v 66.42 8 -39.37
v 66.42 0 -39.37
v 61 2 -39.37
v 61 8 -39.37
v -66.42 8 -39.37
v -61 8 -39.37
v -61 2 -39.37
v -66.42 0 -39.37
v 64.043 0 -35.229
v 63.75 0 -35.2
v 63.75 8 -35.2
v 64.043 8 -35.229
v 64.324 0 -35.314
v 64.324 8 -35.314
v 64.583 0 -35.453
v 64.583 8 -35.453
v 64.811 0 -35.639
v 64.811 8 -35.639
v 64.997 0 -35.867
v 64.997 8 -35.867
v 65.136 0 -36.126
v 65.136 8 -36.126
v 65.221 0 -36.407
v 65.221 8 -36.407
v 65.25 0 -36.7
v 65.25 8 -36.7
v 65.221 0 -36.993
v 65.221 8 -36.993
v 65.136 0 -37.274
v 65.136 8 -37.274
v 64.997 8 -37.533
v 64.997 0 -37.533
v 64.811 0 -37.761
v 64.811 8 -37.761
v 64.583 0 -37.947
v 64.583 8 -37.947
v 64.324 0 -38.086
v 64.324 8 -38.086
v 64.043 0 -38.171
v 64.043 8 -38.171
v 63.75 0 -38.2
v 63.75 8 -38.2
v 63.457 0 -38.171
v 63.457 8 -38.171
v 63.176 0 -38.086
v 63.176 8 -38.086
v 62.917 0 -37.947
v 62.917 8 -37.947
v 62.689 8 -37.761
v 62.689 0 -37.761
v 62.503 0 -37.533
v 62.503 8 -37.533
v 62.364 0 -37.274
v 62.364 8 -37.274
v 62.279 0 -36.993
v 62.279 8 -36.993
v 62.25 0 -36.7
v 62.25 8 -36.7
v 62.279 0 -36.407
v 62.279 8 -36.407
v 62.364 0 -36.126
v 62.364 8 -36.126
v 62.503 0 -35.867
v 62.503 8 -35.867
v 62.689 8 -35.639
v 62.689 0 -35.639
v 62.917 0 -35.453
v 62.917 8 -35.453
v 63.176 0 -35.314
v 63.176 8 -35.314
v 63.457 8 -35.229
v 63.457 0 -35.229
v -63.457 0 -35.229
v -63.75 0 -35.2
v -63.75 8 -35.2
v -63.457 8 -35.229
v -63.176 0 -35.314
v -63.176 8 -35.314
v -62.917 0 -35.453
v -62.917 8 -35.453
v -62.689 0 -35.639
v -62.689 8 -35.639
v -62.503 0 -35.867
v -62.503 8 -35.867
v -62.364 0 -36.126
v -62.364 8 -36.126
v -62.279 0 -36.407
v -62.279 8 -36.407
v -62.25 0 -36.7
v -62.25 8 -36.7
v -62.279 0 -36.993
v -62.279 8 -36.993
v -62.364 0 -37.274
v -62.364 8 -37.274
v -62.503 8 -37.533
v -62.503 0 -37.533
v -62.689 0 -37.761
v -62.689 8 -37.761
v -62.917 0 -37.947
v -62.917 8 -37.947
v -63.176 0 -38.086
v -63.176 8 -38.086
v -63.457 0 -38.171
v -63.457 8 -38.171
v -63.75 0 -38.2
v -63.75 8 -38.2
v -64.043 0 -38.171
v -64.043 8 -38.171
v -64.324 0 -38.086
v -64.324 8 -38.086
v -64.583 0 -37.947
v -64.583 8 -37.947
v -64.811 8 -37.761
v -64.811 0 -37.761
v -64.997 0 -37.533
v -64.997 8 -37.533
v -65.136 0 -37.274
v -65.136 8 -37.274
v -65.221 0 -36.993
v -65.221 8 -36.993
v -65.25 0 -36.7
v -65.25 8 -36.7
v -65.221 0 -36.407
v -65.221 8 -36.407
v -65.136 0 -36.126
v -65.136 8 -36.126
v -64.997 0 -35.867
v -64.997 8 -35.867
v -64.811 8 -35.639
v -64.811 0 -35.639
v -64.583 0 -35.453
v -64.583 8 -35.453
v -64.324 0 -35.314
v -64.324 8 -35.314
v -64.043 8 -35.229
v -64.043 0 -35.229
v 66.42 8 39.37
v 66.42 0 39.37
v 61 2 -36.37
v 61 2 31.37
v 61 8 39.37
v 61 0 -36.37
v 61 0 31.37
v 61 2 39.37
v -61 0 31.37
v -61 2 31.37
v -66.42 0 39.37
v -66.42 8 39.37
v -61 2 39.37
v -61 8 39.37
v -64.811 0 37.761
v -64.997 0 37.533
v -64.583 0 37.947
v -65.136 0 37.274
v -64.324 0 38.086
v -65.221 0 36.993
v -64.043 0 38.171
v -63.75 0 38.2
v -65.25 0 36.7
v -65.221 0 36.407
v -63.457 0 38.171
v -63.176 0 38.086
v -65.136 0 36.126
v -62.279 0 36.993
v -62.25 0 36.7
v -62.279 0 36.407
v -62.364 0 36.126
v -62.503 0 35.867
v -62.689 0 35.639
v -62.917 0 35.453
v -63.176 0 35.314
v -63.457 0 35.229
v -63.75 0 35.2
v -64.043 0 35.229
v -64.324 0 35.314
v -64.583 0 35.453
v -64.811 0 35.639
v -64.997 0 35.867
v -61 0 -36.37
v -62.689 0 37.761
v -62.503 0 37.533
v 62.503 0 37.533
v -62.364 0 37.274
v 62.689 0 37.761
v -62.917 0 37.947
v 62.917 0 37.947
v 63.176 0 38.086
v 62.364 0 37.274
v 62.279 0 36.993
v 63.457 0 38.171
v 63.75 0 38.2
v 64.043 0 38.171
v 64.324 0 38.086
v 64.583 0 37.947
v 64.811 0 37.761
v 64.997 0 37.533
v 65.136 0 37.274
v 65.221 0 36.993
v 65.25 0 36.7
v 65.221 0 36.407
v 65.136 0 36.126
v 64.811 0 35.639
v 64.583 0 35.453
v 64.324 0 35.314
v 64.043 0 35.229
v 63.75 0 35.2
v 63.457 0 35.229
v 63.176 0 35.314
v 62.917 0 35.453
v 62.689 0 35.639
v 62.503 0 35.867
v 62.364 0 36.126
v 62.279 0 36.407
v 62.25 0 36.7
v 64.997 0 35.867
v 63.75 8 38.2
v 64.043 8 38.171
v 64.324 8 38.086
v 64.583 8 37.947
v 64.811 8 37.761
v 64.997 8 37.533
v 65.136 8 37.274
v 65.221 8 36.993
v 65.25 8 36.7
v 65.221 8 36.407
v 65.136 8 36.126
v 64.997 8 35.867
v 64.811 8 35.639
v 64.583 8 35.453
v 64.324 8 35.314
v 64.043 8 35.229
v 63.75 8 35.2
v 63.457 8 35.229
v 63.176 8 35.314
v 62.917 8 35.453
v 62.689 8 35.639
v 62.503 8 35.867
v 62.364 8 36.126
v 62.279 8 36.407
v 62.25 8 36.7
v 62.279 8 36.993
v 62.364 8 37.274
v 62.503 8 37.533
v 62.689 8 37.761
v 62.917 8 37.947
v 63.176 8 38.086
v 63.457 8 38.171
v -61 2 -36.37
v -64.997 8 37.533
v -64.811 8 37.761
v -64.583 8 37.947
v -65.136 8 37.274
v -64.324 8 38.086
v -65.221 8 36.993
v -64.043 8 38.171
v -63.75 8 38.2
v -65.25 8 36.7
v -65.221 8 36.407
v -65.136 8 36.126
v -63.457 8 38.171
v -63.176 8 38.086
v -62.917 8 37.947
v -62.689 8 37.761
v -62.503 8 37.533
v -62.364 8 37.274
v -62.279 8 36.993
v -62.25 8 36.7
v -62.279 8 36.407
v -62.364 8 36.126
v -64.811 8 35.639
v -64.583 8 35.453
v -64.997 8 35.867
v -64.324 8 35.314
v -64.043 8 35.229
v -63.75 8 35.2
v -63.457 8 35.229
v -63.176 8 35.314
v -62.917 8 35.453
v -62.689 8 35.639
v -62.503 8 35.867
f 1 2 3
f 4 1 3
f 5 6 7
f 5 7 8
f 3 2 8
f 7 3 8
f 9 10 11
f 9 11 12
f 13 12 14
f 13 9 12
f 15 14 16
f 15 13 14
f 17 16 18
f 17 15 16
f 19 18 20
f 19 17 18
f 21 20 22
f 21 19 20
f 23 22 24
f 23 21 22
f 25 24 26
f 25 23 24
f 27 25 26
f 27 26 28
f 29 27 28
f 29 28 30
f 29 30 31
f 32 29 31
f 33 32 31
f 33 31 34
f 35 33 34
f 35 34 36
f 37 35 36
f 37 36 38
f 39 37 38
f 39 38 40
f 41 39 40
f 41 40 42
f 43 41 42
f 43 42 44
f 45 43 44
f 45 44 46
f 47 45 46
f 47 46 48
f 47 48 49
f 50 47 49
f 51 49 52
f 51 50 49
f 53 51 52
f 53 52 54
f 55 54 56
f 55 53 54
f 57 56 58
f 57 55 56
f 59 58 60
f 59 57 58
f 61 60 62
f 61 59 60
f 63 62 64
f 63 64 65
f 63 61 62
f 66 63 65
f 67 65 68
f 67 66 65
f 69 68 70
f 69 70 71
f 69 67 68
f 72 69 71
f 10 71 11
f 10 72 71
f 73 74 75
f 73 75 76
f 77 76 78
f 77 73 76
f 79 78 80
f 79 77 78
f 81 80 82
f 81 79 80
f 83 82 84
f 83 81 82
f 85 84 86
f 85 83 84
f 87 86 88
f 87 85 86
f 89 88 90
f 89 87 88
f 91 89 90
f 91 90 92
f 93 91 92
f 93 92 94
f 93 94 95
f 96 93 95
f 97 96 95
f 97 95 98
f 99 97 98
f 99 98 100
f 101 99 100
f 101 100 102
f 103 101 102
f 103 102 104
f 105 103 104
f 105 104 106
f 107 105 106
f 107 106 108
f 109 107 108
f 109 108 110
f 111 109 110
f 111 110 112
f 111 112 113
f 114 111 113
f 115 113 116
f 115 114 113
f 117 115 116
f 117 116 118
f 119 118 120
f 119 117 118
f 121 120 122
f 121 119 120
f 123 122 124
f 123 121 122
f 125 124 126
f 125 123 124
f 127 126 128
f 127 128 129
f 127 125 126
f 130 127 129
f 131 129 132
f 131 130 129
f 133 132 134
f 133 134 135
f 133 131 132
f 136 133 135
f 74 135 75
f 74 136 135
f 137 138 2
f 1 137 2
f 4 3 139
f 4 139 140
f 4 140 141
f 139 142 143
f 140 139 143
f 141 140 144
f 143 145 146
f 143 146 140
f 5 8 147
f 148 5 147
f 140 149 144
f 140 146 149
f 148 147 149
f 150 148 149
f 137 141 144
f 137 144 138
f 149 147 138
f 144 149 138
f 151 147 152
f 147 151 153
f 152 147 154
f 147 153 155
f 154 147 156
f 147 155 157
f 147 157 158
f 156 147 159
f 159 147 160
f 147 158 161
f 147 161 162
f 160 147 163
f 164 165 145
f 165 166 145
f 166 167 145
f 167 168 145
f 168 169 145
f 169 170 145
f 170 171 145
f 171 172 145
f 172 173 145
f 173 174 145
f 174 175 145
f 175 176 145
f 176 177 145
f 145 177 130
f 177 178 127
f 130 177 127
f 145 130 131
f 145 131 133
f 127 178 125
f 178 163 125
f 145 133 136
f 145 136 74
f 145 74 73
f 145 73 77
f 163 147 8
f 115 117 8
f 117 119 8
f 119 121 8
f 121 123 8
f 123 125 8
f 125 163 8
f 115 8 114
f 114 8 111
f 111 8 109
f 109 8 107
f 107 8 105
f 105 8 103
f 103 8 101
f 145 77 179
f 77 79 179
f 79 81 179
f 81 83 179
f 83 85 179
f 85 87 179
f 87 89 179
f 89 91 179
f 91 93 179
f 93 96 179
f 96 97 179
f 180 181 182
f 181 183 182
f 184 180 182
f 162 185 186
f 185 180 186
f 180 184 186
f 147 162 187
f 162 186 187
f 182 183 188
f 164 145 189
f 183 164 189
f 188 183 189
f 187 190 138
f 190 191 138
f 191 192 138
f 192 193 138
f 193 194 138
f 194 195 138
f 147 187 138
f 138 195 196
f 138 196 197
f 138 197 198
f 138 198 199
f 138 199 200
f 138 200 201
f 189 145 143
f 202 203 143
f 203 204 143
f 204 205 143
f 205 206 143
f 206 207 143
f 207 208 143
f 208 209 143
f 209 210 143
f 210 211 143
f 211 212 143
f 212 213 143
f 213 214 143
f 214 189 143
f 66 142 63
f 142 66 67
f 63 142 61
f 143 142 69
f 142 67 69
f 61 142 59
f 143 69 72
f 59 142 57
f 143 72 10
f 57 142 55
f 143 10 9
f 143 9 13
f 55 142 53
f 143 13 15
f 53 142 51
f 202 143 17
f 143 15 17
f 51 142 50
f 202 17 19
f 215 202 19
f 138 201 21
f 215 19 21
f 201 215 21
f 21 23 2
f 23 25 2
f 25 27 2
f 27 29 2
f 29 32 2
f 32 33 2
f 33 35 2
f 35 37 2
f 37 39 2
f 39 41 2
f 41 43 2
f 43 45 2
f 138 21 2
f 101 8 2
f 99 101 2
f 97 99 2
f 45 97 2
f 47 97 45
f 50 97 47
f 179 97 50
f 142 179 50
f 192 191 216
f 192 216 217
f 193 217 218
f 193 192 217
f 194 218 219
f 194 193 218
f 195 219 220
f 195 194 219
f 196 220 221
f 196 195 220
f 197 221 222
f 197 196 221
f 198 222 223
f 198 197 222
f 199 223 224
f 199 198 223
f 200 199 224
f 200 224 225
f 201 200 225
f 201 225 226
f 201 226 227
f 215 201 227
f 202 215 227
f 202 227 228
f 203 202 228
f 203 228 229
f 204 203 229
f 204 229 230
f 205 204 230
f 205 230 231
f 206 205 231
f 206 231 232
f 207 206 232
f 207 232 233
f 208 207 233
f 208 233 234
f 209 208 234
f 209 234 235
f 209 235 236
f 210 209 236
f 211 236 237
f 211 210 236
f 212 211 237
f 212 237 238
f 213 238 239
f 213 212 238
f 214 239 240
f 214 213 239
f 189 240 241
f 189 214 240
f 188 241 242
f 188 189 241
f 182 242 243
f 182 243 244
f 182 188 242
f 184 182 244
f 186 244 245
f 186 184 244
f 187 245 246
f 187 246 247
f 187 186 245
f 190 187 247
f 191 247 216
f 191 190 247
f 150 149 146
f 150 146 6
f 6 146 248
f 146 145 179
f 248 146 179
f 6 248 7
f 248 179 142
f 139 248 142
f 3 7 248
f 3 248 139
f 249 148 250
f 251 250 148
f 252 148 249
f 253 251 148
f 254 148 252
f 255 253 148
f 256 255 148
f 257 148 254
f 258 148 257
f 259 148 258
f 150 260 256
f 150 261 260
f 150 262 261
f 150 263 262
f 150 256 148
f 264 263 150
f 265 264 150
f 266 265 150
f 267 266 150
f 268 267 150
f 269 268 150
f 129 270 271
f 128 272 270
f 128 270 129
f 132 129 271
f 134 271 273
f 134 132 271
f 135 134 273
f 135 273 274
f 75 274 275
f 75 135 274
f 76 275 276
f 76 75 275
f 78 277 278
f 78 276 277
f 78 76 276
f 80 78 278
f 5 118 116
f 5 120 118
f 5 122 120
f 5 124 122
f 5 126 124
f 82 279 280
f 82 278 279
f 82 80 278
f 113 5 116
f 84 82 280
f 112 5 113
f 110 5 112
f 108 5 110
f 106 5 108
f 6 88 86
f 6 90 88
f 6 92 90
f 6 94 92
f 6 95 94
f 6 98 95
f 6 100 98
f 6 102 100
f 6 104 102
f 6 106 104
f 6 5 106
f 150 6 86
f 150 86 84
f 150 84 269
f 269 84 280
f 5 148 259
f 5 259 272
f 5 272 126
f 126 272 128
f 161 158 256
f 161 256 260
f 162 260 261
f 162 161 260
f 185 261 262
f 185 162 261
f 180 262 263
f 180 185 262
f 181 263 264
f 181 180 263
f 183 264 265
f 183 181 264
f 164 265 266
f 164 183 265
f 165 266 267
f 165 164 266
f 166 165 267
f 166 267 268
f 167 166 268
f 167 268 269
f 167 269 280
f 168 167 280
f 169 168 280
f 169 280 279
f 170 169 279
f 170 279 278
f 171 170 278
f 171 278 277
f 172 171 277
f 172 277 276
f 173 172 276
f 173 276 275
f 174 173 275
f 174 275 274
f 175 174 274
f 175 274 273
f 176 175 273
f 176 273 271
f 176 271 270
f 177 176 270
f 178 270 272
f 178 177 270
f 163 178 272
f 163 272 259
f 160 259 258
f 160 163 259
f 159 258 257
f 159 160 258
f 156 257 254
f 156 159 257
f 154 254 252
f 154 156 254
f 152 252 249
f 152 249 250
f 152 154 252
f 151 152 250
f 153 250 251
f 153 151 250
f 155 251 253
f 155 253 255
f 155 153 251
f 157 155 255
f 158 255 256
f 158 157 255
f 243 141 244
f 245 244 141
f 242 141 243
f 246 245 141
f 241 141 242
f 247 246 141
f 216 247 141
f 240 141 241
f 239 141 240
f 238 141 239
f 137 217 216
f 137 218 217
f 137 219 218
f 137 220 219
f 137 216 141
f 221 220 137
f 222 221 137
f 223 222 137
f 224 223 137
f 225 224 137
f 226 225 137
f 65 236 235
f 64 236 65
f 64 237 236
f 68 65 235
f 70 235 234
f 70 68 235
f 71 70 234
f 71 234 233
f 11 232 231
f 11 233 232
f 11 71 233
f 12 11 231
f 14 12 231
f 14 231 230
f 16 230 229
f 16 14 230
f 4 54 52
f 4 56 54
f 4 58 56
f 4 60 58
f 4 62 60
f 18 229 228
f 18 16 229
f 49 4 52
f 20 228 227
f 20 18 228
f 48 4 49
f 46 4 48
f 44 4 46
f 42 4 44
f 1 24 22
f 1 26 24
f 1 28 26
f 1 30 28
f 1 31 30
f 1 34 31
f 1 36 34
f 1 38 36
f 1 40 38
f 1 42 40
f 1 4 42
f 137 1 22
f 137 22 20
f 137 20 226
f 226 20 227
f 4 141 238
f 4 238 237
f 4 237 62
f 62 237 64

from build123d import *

# Parameters (mm, degrees)
SKETCH1_W           = 132.84
SKETCH1_H           = 78.74
SKETCH1_W_2         = 122
SKETCH1_H_2         = 67.74
SKETCH1_R           = 1.5
BOSS_EXTRUDE1_DEPTH = 2
SKETCH1_5_W         = 5.42
SKETCH1_5_H         = 78.74
SKETCH1_5_R         = 1.5
BOSS_EXTRUDE3_DEPTH = 8


with BuildPart() as part:
    # Sketch1 → Boss-Extrude1 (new body)
    with BuildSketch(Plane(origin=(0, 0, 0), x_dir=(1, 0, 0), z_dir=(0, 1, 0))):
        Rectangle(SKETCH1_W, SKETCH1_H)
        with Locations((0, 2.5)):
            Rectangle(SKETCH1_W_2, SKETCH1_H_2, mode=Mode.SUBTRACT)
        with Locations((-63.75, -36.7)):
            Circle(SKETCH1_R, mode=Mode.SUBTRACT)
        with Locations((-63.75, 36.7)):
            Circle(SKETCH1_R, mode=Mode.SUBTRACT)
        with Locations((63.75, -36.7)):
            Circle(SKETCH1_R, mode=Mode.SUBTRACT)
        with Locations((63.75, 36.7)):
            Circle(SKETCH1_R, mode=Mode.SUBTRACT)
    extrude(amount=BOSS_EXTRUDE1_DEPTH)

    # Sketch1<5> → Boss-Extrude3 (add)
    # profile 1 of 2: a face of its own
    with BuildSketch(Plane(origin=(0, 0, 0), x_dir=(1, 0, 0), z_dir=(0, 1, 0))):
        with Locations((-63.71, 0)):
            Rectangle(SKETCH1_5_W, SKETCH1_5_H)
        with Locations((-63.75, -36.7)):
            Circle(SKETCH1_5_R, mode=Mode.SUBTRACT)
        with Locations((-63.75, 36.7)):
            Circle(SKETCH1_5_R, mode=Mode.SUBTRACT)
    # profile 2 of 2: a face of its own
    with BuildSketch(Plane(origin=(0, 0, 0), x_dir=(1, 0, 0), z_dir=(0, 1, 0))):
        with Locations((63.71, 0)):
            Rectangle(SKETCH1_5_W, SKETCH1_5_H)
        with Locations((63.75, -36.7)):
            Circle(SKETCH1_5_R, mode=Mode.SUBTRACT)
        with Locations((63.75, 36.7)):
            Circle(SKETCH1_5_R, mode=Mode.SUBTRACT)
    extrude(amount=BOSS_EXTRUDE3_DEPTH)


solid = part.part
